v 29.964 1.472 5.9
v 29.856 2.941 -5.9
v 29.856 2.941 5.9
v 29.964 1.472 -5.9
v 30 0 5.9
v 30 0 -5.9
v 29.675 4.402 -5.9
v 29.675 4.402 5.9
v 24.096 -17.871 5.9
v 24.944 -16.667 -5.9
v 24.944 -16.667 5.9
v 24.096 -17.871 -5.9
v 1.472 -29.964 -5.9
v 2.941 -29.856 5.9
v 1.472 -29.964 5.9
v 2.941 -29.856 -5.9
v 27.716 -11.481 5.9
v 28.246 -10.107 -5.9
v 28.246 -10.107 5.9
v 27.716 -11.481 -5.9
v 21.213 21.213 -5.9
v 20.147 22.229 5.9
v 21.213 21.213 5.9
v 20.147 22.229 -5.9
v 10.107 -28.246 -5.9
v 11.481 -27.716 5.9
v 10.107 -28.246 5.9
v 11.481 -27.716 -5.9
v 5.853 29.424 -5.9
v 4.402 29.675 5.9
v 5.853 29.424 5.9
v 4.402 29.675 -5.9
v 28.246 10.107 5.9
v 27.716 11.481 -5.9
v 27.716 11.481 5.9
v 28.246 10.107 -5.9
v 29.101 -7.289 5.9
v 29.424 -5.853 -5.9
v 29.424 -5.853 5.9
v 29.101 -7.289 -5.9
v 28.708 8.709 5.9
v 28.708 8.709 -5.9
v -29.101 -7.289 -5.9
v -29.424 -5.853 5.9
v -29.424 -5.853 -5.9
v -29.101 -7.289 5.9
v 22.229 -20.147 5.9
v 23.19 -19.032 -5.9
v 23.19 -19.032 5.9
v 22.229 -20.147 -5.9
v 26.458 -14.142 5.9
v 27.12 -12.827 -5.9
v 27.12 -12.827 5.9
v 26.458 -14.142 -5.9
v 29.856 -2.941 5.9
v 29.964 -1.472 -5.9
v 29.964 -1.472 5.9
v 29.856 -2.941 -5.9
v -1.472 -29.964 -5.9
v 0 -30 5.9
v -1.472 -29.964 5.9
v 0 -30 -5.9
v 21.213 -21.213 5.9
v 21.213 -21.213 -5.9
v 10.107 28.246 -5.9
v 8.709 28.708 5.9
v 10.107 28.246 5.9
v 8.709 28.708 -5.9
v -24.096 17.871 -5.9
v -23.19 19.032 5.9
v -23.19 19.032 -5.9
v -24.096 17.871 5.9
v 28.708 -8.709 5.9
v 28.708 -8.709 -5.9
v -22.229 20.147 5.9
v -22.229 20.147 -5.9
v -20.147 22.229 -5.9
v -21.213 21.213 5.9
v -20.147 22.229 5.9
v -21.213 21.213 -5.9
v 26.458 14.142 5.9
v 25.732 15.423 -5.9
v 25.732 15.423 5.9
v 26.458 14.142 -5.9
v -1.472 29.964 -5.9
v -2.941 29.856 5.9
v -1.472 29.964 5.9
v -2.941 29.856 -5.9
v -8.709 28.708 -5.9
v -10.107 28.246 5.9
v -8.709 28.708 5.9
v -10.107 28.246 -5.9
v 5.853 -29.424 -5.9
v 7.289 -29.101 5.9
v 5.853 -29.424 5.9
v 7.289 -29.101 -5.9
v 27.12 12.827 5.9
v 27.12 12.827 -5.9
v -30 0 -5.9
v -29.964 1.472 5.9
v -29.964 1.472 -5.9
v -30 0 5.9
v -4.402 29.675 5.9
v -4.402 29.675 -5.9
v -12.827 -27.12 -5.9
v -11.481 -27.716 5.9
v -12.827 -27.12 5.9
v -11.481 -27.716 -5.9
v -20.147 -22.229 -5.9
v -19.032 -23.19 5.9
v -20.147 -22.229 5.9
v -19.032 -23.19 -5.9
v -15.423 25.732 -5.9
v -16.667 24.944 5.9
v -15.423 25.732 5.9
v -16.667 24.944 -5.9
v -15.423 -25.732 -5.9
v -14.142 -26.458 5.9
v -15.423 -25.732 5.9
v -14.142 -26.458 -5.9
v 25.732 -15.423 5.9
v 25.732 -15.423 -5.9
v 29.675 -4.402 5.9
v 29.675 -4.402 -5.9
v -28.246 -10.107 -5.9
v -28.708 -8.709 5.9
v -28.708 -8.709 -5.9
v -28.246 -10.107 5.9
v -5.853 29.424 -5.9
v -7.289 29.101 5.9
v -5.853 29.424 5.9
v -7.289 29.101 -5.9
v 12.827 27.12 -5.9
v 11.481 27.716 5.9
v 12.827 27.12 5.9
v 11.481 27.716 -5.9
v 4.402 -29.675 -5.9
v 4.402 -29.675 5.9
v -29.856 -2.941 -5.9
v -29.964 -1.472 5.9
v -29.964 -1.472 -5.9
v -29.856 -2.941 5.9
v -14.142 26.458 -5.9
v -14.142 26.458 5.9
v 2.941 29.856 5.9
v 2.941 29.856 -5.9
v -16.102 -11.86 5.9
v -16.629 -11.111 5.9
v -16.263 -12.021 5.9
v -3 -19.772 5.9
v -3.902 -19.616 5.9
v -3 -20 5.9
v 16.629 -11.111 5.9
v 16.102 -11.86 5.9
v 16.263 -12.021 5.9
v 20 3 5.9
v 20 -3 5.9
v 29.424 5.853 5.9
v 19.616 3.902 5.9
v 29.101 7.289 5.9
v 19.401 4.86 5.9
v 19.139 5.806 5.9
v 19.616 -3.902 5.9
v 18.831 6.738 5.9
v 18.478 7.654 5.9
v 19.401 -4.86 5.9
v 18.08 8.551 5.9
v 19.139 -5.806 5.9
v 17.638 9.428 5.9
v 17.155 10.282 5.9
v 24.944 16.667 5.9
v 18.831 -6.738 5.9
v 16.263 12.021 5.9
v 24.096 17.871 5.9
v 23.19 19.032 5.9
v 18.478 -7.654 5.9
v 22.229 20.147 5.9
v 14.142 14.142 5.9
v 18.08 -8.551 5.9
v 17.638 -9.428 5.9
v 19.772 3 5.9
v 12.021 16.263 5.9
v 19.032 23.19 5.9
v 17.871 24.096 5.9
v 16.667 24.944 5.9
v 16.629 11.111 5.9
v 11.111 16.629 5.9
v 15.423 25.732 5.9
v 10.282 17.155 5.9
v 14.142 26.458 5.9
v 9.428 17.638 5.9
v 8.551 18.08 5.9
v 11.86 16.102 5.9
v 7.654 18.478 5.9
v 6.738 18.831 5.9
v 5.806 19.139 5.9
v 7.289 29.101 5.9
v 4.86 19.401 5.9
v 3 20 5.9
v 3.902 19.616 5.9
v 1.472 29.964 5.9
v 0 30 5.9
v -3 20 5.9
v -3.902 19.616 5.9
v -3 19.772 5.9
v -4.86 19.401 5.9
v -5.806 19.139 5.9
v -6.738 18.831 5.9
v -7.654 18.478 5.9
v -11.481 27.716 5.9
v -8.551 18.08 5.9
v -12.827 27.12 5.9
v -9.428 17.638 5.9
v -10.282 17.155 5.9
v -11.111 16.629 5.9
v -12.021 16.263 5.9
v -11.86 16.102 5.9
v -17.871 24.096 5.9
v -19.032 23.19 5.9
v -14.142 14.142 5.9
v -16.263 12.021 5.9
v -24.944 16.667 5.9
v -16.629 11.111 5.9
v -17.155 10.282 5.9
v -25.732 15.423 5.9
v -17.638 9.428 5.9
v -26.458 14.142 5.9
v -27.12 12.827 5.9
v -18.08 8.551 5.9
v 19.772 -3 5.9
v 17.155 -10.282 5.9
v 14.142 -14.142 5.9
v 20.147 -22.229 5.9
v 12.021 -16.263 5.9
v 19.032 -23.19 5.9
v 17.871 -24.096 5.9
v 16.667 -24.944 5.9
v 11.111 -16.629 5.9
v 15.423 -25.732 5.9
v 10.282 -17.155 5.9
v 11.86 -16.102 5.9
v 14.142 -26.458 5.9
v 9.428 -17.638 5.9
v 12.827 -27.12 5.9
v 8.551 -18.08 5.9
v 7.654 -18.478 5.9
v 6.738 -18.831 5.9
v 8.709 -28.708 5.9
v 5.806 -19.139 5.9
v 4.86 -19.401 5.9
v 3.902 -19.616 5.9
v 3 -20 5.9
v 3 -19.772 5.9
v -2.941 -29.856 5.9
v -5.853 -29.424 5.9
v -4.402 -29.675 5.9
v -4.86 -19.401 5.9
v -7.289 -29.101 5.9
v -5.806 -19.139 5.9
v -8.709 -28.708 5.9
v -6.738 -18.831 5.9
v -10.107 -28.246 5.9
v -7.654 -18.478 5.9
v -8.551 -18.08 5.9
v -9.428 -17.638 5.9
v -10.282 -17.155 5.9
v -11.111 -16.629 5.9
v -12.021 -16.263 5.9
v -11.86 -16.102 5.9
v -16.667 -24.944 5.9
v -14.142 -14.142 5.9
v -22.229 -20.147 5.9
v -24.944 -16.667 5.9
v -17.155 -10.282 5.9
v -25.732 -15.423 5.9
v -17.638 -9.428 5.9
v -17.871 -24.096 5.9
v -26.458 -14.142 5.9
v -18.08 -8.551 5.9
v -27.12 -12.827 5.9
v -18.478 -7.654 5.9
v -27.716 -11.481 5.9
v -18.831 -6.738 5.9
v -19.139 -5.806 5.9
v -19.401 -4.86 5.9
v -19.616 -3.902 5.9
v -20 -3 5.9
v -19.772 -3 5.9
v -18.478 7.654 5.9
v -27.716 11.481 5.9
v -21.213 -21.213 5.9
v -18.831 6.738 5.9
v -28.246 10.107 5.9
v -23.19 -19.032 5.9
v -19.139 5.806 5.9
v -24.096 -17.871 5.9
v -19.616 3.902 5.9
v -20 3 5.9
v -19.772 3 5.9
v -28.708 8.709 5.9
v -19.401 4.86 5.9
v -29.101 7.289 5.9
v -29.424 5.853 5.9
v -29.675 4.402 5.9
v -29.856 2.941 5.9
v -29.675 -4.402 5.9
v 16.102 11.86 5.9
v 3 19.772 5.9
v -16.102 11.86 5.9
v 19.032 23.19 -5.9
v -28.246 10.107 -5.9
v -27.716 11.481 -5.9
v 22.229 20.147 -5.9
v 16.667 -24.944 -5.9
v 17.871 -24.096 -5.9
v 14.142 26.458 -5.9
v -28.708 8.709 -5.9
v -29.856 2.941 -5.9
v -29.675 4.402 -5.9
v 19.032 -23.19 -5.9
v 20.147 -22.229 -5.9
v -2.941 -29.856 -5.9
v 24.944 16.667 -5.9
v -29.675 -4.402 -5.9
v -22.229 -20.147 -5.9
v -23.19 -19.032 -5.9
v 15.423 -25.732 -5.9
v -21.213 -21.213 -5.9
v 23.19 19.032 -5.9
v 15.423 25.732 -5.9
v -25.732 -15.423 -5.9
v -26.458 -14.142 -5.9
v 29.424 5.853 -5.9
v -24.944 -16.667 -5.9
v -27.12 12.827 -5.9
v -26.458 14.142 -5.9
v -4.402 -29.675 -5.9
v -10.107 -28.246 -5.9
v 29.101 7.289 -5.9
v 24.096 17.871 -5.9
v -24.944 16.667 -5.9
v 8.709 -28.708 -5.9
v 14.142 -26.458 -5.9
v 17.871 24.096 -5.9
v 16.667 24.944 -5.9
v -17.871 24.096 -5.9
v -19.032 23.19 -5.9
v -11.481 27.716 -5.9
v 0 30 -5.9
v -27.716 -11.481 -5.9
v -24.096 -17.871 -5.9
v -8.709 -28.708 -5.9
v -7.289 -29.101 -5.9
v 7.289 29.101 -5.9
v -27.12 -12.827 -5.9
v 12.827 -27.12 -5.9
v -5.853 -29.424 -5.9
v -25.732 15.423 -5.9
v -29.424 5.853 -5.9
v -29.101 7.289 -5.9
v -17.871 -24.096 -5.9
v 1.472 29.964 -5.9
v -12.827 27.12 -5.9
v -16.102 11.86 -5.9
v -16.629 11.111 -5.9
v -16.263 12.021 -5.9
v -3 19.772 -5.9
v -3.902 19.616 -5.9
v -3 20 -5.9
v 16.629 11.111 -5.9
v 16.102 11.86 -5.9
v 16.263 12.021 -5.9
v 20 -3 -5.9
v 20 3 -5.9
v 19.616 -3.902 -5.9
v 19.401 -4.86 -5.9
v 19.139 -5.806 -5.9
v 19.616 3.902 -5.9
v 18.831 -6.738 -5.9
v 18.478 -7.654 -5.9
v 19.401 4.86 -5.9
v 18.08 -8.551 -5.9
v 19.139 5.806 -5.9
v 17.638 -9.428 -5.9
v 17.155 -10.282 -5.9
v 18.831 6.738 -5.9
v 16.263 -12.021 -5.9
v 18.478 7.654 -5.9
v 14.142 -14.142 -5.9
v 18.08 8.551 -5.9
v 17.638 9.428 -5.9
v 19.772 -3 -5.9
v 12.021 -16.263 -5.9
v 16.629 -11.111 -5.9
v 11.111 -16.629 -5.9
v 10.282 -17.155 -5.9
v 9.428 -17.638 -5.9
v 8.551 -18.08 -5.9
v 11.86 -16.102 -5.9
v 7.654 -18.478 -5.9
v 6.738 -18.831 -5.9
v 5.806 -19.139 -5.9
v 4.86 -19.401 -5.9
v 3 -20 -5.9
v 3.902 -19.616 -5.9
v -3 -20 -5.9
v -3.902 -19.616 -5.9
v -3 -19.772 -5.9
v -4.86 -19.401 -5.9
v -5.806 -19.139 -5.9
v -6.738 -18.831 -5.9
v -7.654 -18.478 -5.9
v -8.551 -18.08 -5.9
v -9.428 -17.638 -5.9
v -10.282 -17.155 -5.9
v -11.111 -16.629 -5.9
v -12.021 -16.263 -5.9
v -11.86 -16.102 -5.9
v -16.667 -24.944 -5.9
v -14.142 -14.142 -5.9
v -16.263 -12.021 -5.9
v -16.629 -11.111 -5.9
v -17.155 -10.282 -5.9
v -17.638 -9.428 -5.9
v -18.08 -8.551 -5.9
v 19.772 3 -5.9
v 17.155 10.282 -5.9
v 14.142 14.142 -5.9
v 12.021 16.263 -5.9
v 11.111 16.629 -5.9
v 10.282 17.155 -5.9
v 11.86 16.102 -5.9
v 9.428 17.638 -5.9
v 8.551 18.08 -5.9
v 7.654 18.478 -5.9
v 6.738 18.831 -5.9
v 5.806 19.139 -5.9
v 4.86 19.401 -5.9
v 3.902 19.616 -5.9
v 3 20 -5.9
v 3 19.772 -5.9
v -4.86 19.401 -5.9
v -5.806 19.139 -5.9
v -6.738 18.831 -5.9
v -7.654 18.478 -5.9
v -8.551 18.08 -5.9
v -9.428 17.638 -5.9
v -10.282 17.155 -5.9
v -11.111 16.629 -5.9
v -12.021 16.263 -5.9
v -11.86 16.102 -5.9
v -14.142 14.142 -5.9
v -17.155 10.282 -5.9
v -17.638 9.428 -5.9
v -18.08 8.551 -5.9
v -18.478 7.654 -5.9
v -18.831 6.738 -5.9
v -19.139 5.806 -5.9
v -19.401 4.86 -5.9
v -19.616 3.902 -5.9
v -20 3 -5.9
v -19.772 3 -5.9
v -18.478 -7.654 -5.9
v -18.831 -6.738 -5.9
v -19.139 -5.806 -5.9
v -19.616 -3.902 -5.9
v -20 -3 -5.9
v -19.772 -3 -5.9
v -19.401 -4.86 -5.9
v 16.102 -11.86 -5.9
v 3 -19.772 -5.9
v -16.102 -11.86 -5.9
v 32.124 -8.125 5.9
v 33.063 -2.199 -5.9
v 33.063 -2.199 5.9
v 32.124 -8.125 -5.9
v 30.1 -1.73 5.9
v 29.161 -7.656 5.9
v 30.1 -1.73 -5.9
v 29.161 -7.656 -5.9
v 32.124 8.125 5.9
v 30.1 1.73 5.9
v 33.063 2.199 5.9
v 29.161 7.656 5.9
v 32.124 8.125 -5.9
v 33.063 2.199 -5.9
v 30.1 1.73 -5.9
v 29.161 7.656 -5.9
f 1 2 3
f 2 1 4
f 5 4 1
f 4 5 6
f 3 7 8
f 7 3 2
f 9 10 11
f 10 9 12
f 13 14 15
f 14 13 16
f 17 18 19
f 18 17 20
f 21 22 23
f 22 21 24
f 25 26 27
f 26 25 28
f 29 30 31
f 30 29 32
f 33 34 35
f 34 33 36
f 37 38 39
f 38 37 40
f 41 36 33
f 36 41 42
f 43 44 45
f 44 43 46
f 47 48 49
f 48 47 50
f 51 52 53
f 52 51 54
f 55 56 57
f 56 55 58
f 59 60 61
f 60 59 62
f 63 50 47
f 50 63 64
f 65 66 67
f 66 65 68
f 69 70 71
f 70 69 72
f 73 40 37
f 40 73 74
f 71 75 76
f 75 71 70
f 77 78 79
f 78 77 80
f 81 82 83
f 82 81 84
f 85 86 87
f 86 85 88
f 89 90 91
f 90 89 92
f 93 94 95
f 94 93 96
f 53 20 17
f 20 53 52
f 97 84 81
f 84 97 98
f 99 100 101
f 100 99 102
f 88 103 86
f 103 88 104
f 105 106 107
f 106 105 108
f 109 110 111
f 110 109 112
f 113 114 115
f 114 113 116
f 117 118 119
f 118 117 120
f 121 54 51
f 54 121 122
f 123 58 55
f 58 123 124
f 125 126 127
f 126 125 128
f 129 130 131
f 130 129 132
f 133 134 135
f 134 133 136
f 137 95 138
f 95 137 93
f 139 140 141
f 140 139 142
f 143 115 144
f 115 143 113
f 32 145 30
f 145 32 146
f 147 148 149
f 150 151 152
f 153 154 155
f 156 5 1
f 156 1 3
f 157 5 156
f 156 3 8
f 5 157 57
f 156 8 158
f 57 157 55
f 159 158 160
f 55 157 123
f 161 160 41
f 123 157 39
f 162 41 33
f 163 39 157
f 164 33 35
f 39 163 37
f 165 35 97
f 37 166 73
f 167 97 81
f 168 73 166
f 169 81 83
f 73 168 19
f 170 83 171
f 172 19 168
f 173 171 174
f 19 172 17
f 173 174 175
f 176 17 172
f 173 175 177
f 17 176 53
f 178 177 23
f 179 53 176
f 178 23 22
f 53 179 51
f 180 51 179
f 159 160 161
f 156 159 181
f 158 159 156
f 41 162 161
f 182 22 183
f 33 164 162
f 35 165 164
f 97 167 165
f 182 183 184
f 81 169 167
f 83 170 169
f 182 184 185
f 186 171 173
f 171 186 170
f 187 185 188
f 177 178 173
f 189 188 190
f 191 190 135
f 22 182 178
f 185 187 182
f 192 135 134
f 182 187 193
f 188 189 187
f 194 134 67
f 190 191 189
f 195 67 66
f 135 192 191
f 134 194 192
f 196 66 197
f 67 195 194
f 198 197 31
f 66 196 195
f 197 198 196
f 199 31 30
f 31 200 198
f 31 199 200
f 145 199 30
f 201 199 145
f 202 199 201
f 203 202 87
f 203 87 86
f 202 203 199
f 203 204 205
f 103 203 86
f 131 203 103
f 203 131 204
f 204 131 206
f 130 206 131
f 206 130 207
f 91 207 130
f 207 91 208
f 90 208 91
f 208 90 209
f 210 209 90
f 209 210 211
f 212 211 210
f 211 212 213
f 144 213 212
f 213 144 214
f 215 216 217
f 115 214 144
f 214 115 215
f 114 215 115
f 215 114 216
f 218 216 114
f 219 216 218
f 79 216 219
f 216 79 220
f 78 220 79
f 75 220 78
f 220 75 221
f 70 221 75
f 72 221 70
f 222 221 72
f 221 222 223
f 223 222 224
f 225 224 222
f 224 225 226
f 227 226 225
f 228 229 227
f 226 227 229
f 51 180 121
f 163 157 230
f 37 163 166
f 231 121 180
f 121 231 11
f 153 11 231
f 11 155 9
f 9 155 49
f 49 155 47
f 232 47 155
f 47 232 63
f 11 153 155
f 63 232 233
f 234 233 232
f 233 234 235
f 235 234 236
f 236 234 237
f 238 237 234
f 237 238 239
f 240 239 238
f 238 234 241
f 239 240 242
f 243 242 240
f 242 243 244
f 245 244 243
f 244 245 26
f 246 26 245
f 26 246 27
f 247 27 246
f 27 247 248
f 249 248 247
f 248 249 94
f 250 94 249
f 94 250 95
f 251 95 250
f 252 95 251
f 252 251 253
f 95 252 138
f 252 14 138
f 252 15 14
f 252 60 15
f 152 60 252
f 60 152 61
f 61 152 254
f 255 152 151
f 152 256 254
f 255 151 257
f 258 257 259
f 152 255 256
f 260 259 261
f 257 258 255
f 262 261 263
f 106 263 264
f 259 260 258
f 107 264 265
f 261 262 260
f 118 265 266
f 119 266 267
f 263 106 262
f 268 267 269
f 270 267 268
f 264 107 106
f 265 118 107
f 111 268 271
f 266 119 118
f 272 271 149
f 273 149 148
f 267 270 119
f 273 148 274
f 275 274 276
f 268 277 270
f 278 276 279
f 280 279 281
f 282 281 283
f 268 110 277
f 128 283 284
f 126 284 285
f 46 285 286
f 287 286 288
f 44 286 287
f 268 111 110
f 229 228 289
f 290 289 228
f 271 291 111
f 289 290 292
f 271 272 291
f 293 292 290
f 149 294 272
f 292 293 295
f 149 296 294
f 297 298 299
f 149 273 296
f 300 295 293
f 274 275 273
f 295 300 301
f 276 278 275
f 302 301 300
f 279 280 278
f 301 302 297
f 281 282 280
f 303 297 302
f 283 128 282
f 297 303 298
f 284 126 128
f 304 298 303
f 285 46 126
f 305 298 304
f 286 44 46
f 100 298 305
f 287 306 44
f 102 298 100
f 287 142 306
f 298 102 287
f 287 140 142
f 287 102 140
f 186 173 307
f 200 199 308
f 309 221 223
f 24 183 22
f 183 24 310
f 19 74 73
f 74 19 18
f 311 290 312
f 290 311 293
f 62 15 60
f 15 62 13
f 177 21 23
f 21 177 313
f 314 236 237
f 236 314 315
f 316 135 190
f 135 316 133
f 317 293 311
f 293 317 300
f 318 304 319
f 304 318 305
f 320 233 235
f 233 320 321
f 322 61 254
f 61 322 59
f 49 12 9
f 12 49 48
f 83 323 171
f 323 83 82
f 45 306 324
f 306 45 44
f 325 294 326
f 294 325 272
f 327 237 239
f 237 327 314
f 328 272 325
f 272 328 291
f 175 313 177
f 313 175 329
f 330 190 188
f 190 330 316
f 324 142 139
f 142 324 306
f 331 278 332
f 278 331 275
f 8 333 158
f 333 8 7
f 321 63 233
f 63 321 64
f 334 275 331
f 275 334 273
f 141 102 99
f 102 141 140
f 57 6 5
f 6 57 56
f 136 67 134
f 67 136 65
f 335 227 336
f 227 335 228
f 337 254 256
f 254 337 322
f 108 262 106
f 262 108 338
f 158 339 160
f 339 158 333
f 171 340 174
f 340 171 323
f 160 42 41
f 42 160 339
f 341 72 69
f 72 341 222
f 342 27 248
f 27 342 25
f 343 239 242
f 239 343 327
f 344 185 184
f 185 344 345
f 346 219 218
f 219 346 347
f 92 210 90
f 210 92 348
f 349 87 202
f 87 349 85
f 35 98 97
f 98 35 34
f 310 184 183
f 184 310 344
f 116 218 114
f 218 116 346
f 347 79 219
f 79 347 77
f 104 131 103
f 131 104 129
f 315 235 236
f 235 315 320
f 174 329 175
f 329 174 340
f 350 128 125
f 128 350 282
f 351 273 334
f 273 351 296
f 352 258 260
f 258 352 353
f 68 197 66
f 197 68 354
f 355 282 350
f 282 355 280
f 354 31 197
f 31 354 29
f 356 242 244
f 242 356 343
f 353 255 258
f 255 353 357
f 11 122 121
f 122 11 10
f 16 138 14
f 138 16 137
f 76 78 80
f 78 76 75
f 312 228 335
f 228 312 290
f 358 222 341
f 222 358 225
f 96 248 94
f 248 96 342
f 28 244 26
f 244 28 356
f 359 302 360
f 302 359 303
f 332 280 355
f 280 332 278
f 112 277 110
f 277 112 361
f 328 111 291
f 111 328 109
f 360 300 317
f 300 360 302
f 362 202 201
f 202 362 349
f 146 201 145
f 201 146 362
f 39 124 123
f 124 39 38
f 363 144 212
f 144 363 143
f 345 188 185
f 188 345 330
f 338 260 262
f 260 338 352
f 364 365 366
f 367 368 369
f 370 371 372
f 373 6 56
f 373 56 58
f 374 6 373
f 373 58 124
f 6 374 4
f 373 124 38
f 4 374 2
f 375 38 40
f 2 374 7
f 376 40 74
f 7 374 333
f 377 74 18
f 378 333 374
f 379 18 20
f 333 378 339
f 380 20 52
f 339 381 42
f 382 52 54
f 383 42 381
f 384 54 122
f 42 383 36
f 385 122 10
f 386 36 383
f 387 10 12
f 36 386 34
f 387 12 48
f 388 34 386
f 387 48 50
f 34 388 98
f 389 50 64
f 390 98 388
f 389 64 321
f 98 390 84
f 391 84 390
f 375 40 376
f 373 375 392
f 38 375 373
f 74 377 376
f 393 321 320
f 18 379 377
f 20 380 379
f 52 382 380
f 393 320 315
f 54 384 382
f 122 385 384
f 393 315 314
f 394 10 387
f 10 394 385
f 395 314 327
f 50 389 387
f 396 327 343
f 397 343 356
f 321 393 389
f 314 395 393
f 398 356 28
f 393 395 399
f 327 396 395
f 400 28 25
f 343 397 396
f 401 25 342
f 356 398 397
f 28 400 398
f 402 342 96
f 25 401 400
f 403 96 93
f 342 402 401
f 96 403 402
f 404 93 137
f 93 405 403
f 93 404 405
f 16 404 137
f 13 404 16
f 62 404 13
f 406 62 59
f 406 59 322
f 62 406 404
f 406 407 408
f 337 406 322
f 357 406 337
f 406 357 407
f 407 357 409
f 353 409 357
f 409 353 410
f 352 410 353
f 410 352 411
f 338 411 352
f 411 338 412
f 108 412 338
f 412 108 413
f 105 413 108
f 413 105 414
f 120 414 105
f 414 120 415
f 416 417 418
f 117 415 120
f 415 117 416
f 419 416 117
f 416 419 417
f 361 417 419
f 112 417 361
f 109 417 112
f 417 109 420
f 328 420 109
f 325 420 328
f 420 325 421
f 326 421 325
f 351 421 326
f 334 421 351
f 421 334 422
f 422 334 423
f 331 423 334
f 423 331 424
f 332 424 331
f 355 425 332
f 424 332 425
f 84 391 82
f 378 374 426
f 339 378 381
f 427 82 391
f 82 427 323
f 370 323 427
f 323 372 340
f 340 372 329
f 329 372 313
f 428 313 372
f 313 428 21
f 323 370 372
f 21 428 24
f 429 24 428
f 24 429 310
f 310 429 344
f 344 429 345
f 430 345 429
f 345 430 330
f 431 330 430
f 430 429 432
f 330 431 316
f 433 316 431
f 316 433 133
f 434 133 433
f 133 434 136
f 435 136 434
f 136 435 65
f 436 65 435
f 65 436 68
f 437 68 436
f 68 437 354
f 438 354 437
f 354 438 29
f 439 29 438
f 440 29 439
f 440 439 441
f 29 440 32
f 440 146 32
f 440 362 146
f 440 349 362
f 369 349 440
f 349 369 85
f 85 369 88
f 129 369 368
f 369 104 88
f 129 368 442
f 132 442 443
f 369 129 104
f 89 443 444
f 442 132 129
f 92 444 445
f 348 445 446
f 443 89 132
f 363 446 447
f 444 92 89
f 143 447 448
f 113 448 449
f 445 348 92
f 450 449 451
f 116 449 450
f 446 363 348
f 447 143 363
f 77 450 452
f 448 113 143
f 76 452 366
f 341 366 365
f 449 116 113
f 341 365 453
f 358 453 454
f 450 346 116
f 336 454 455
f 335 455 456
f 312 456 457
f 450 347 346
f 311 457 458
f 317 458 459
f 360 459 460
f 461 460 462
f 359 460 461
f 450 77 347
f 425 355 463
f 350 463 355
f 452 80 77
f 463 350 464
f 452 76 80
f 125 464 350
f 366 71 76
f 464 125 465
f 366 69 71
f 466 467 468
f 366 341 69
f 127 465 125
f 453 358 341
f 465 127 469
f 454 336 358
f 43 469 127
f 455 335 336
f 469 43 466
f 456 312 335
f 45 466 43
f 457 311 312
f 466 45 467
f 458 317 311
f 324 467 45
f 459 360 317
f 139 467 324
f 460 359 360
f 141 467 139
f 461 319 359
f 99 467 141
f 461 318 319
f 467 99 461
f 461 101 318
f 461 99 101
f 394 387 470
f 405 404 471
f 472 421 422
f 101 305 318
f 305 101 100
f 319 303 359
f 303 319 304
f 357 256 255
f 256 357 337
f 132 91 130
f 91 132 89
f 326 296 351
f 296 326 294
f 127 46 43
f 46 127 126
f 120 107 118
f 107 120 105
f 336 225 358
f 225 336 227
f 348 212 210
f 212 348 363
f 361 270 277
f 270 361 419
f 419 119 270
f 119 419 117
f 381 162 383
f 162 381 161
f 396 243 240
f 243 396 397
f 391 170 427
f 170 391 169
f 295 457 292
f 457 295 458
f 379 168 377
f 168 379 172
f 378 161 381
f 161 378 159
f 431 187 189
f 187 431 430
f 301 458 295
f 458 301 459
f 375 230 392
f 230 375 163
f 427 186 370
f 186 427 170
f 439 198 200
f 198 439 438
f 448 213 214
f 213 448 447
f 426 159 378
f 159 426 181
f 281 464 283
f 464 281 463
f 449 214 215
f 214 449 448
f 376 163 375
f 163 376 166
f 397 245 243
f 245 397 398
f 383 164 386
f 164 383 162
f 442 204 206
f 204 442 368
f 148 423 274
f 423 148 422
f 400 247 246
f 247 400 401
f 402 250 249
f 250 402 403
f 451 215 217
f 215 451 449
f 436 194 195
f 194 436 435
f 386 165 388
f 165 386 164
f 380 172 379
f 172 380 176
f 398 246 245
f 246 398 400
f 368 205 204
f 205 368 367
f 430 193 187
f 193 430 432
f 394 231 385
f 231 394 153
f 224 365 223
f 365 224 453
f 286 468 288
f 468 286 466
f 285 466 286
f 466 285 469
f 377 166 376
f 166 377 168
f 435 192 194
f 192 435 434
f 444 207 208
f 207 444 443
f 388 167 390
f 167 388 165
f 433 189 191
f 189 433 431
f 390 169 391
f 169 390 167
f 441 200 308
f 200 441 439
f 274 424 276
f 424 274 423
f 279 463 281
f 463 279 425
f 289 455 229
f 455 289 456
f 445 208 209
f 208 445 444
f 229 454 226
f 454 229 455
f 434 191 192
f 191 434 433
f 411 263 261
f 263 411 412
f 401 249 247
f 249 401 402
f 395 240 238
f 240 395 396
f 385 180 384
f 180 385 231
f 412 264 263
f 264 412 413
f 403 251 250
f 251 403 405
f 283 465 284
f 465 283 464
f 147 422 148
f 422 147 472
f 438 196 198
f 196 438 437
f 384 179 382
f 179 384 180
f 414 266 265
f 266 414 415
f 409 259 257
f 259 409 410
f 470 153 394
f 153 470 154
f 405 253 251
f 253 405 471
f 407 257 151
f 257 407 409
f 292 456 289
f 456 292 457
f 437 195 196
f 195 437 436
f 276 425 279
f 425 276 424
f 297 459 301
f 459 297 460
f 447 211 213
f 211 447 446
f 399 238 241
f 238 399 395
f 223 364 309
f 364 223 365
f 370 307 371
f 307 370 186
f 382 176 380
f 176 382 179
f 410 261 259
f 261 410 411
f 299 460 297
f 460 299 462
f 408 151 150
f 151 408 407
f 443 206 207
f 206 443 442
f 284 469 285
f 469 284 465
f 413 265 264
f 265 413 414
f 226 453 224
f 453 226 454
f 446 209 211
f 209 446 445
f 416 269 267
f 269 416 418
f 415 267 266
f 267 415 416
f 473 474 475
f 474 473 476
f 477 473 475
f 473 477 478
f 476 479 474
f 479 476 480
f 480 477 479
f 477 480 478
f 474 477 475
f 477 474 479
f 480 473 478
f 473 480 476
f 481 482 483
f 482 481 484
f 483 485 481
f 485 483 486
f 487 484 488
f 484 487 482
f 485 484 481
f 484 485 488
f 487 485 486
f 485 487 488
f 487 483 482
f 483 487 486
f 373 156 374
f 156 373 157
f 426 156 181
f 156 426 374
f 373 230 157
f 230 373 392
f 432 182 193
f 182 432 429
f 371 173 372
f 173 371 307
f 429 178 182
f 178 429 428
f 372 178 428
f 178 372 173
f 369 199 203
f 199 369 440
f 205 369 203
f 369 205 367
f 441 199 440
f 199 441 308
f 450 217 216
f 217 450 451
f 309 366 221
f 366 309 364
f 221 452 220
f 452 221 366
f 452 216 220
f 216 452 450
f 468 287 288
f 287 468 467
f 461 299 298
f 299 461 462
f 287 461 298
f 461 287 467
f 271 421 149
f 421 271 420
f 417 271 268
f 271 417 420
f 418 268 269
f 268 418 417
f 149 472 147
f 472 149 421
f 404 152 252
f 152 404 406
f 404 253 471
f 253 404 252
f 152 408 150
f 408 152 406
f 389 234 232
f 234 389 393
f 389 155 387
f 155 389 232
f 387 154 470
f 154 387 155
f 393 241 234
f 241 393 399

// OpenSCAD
$fn=128;

od_x = 60.0;
od_y = 60.6;
h = 11.8;

od = min(od_x, od_y);
outer_r = od/2;

id = 40.0;
inner_r = id/2;

notch_count = 8;
notch_depth = 3.0;
notch_width = 6.0;

tab_count = 2;
tab_w = 6.0;
tab_t = 3.0;
tab_h = h;
tab_angle_span = 18;

module base_ring() {
    difference() {
        cylinder(h=h, r=outer_r, center=true);
        cylinder(h=h+0.4, r=inner_r, center=true);
    }
}

module inner_notches() {
    for (i = [0:notch_count-1]) {
        rotate([0,0, i*360/notch_count])
            translate([inner_r - notch_depth/2, 0, 0])
                cube([notch_depth, notch_width, h+0.6], center=true);
    }
}

module outer_tabs() {
    for (j = [0:tab_count-1]) {
        rotate([0,0, (j-(tab_count-1)/2)*tab_angle_span])
            translate([outer_r + tab_t/2, 0, 0])
                cube([tab_t, tab_w, tab_h], center=true);
    }
}

difference() {
    union() {
        base_ring();
        outer_tabs();
    }
    inner_notches();
}
